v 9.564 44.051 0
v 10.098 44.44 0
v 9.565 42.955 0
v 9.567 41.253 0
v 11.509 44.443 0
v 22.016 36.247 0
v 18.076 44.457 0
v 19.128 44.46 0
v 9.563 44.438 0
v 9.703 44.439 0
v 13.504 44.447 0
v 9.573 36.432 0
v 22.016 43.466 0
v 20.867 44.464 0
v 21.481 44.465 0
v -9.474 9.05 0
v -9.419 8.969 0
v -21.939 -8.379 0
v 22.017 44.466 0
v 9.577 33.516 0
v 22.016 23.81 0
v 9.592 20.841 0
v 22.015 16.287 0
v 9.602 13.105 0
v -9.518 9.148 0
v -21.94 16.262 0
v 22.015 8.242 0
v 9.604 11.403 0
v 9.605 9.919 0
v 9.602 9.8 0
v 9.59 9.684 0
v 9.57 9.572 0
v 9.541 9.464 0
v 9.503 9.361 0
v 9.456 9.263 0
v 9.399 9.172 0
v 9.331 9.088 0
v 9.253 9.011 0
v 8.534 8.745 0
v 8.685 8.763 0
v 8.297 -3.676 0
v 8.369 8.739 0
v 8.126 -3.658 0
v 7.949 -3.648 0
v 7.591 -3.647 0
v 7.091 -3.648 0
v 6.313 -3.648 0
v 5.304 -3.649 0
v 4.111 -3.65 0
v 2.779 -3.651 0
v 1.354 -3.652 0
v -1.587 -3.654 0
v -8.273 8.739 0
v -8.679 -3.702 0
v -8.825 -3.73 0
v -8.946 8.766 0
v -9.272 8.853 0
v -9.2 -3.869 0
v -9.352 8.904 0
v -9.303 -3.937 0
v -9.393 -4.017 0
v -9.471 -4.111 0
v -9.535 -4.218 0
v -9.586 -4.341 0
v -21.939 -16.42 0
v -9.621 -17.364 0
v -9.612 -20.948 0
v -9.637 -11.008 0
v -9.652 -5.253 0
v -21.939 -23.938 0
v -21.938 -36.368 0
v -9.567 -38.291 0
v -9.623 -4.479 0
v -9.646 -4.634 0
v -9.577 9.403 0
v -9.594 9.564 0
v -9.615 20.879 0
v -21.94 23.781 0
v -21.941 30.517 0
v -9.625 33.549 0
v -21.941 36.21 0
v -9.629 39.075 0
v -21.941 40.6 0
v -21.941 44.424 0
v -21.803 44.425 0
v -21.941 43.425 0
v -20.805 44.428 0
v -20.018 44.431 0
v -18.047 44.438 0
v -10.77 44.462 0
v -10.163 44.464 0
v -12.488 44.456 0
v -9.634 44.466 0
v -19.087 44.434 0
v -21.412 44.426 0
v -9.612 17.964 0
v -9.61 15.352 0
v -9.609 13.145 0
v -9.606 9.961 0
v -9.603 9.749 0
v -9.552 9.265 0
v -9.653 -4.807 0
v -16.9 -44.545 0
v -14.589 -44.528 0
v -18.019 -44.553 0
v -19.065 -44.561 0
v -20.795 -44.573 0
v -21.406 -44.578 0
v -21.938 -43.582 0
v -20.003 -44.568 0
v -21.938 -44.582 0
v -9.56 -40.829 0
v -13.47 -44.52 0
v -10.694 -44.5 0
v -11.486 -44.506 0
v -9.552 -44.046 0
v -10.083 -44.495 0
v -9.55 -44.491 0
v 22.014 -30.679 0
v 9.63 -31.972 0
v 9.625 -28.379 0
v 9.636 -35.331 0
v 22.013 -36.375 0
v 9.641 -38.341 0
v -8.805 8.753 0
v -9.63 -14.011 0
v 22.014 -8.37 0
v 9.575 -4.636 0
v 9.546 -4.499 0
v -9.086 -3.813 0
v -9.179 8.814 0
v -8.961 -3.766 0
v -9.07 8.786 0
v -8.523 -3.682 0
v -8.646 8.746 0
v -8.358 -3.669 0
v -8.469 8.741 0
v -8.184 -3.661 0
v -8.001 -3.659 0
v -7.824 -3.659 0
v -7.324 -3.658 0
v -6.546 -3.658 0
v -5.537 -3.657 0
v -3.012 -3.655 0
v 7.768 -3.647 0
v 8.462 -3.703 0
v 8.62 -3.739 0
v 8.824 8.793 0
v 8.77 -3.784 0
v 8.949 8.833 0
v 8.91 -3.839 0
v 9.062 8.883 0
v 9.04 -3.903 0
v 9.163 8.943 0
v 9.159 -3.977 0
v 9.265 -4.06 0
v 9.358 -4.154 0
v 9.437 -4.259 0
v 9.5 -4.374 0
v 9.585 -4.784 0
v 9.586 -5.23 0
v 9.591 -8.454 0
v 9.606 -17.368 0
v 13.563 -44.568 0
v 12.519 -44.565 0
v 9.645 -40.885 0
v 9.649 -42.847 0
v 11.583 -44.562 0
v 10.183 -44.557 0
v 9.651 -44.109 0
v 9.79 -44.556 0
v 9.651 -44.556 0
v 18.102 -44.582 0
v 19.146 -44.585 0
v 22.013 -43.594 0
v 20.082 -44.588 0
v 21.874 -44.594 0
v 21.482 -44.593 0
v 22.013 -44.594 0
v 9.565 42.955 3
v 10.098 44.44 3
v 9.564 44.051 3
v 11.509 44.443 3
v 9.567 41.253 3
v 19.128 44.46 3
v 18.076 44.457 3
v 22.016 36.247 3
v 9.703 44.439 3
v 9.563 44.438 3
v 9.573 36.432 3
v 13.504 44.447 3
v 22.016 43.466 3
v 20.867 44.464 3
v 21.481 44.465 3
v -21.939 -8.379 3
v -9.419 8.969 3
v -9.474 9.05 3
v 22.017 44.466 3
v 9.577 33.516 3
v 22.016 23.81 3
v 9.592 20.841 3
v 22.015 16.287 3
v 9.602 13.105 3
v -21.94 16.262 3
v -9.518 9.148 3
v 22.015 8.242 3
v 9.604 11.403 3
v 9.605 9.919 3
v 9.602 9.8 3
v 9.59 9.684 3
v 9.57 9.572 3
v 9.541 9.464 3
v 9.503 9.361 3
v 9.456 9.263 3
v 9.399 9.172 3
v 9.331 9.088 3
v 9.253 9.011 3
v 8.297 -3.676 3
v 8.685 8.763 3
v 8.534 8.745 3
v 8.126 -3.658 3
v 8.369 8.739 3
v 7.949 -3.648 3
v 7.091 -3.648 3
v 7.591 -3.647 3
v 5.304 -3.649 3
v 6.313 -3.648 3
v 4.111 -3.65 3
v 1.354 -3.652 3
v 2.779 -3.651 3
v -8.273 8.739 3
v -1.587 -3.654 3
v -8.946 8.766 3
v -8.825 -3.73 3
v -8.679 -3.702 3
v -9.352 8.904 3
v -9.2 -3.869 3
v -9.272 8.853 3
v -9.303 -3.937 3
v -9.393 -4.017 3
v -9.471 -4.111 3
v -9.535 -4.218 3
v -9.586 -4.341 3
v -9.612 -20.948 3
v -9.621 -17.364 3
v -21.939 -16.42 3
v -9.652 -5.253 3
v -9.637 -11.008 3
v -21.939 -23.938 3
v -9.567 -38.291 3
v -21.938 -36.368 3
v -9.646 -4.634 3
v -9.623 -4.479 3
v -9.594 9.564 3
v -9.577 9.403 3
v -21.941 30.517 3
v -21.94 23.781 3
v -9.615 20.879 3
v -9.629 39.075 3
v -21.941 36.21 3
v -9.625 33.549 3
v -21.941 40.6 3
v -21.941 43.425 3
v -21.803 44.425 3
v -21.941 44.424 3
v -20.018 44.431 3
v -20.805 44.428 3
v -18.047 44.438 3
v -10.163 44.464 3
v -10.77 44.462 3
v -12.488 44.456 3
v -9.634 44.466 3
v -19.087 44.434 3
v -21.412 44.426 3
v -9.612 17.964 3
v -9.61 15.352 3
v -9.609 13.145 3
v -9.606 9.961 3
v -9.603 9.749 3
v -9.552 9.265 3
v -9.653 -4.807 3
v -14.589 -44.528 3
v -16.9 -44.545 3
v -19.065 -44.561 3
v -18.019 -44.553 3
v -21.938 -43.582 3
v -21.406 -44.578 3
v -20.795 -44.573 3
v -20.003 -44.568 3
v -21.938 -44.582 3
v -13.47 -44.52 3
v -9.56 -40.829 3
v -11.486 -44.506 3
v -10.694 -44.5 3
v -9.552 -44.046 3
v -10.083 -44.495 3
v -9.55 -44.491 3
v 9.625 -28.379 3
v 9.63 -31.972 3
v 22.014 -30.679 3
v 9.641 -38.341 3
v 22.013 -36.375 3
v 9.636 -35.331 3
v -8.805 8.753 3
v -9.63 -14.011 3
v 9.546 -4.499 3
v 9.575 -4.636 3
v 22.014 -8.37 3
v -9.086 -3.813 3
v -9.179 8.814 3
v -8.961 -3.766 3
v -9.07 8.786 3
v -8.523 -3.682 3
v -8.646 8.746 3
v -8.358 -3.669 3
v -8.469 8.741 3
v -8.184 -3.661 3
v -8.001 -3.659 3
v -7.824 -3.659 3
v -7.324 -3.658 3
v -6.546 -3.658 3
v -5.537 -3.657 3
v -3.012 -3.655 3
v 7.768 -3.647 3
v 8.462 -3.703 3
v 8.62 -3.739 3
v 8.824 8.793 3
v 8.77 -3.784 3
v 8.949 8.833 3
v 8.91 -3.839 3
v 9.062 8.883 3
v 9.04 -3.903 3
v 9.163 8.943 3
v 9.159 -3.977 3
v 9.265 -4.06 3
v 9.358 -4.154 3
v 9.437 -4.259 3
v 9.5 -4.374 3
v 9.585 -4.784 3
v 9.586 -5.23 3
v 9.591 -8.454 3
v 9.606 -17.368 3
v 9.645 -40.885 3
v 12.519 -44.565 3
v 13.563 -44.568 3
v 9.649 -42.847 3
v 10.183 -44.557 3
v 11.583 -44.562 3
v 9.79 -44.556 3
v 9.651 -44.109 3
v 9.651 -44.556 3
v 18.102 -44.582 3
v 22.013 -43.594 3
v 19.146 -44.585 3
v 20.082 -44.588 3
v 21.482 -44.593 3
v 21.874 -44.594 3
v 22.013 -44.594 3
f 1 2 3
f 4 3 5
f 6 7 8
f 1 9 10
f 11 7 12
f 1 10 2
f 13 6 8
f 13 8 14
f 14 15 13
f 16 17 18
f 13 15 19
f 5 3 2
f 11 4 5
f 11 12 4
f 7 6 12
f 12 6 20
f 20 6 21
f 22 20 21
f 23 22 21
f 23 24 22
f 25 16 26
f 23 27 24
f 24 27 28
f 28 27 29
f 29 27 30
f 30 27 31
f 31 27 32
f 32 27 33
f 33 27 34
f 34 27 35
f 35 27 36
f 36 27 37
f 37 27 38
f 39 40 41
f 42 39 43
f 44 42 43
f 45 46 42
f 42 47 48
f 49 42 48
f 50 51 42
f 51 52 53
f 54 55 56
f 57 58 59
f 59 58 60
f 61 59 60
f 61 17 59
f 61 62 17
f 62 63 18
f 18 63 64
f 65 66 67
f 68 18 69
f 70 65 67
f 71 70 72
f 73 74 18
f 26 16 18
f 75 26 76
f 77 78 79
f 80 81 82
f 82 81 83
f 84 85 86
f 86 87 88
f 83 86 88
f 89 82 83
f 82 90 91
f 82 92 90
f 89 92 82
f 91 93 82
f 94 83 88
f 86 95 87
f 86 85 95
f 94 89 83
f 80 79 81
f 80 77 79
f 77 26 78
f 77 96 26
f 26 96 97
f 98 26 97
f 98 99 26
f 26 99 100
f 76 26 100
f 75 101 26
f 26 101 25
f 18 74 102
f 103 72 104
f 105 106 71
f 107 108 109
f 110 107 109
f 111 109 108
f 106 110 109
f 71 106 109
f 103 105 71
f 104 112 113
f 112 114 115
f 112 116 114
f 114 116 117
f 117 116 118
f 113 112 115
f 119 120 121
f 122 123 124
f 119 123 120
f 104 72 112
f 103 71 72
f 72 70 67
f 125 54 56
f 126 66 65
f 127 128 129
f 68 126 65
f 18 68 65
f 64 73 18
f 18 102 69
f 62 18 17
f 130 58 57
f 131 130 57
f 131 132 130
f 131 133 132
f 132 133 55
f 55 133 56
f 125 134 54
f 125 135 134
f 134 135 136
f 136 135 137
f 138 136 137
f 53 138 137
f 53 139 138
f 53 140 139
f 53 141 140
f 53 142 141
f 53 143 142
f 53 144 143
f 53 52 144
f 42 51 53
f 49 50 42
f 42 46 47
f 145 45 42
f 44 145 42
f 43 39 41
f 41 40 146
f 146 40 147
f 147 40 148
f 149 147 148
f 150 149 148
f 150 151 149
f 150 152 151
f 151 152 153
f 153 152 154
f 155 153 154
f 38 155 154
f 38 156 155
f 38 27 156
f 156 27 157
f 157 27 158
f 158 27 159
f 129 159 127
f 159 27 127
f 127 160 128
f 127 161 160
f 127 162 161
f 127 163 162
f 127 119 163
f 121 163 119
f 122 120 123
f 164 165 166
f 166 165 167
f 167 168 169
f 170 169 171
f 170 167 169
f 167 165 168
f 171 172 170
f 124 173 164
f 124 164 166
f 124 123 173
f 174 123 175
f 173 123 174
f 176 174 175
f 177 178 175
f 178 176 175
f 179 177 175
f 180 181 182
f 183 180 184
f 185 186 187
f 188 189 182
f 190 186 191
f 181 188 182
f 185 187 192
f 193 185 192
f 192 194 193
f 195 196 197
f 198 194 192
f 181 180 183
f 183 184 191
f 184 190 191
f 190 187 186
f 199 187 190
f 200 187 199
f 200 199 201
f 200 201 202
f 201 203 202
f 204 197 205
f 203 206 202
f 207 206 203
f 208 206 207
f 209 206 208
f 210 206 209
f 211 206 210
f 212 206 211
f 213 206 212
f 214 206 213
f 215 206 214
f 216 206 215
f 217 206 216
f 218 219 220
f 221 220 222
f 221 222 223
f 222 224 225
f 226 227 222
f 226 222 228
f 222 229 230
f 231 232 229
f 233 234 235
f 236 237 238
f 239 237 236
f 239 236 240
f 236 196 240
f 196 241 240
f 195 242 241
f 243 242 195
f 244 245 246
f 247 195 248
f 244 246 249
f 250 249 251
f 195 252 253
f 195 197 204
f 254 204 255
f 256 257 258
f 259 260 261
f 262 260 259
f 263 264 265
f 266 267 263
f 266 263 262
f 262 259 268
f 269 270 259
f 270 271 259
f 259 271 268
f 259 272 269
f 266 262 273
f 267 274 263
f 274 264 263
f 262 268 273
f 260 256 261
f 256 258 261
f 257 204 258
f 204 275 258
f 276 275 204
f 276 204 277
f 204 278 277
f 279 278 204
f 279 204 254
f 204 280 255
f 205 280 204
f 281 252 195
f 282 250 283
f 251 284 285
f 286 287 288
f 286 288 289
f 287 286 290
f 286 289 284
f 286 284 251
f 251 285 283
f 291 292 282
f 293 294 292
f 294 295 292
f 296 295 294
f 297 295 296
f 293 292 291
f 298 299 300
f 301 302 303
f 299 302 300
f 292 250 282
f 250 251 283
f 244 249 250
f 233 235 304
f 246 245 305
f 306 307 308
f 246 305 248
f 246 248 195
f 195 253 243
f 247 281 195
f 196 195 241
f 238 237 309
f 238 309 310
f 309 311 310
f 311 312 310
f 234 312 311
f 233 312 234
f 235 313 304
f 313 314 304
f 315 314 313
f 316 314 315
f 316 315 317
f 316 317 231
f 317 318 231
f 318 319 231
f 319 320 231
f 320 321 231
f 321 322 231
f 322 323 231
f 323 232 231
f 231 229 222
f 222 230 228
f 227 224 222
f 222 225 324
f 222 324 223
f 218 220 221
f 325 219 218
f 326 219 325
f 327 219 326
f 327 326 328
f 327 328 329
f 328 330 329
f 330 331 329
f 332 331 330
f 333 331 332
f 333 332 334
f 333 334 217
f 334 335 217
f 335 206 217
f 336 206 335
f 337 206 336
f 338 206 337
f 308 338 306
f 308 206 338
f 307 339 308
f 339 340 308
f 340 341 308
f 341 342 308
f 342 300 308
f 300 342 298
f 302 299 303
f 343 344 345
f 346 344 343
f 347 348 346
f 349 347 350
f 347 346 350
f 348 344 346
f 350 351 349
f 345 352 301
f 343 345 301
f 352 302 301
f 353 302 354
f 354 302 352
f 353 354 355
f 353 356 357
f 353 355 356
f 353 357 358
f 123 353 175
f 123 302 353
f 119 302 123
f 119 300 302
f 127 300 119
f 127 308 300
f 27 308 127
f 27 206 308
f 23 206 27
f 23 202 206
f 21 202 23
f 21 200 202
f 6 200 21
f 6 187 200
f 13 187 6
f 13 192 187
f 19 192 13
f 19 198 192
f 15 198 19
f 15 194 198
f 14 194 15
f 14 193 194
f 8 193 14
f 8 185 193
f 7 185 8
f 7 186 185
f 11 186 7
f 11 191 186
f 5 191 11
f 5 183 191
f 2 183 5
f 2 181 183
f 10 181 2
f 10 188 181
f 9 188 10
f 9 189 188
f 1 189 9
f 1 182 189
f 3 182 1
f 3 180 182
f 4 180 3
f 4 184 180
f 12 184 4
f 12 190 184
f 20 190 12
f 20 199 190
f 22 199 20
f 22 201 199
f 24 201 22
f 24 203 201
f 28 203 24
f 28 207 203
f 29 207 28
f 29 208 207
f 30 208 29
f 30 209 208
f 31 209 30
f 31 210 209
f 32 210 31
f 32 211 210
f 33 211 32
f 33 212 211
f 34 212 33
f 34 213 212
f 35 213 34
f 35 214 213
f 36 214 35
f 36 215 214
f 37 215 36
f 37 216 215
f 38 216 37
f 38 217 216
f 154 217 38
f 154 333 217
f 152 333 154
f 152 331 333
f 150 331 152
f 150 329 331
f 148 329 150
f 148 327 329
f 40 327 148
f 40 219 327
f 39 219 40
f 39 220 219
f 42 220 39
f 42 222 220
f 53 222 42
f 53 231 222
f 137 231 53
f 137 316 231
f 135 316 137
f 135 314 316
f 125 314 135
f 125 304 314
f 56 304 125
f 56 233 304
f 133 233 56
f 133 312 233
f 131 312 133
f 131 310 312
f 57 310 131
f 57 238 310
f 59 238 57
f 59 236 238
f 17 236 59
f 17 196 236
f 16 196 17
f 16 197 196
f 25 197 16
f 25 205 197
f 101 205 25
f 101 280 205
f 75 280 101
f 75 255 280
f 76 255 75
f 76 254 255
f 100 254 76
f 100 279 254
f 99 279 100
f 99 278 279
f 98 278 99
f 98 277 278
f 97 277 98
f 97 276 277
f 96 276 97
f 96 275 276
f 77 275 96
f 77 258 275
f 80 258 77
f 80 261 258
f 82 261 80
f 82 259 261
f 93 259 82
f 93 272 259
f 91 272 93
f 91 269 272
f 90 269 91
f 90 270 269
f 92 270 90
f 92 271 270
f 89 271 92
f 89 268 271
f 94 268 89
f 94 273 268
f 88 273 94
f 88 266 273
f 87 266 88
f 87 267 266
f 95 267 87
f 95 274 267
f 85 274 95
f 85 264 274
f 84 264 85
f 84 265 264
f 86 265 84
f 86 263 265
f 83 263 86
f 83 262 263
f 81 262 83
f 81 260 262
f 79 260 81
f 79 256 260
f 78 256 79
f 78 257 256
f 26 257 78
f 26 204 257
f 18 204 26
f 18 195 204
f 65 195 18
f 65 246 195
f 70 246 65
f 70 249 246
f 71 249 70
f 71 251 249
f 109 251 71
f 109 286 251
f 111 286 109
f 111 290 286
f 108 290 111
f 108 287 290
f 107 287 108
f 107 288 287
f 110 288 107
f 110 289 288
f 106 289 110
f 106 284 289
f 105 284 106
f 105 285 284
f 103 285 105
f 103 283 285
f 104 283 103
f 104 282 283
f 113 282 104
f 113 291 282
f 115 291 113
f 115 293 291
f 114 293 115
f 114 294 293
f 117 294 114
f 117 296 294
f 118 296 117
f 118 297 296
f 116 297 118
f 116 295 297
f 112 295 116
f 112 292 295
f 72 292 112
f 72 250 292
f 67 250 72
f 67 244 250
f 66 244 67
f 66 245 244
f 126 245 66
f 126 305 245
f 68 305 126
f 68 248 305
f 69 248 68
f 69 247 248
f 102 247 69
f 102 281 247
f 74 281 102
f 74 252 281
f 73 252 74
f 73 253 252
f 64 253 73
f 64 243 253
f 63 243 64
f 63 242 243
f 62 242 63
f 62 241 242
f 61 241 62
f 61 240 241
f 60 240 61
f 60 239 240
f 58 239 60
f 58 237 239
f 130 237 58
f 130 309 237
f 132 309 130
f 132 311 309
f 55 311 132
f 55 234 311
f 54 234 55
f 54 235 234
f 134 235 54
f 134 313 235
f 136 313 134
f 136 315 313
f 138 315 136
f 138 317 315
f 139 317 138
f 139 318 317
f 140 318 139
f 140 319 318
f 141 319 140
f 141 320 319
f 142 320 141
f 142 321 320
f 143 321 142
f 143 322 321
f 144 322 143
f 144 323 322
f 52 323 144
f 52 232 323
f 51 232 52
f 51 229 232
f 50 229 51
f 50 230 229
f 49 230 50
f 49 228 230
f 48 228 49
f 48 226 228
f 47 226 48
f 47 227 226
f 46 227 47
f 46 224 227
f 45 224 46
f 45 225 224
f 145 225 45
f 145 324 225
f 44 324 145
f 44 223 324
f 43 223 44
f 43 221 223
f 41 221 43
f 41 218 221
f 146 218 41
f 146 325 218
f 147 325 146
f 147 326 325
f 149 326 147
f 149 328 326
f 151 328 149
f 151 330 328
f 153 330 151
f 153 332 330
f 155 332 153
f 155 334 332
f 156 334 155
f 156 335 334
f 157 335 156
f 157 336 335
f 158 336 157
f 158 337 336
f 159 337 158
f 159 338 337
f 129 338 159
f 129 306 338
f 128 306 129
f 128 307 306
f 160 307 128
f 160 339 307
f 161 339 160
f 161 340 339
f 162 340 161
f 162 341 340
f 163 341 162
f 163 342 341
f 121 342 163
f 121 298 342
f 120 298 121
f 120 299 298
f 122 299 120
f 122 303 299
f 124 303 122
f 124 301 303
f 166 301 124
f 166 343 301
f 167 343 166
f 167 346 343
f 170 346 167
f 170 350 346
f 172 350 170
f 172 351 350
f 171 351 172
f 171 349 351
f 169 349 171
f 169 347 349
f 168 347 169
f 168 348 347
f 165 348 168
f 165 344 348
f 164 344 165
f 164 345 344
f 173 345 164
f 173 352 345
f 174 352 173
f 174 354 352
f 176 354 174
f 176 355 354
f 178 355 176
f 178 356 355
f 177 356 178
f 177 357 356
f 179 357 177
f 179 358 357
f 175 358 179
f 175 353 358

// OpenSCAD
// Generated from 交通部公路局（原交通部公路總局）「新式號牌使用之英文字、數字字體」author trace
fudge = 0.1;

module glyph_2012_H(h = 3) {
  difference() {
    linear_extrude(height = h)
      polygon(points = [[-21.9413, 44.4244], [-21.9412, 43.4248], [-21.9411, 40.5999], [-21.941, 36.2105], [-21.9408, 30.5172], [-21.9405, 23.7809], [-21.9403, 16.2623], [-21.94, 8.2223], [-21.9397, -0.0786], [-21.9394, -8.3795], [-21.9392, -16.4196], [-21.9389, -23.9381], [-21.9387, -30.6744], [-21.9385, -36.3677], [-21.9383, -40.7572], [-21.9382, -43.5821], [-21.9382, -44.5816], [-21.7991, -44.5806], [-21.4059, -44.5778], [-20.795, -44.5733], [-20.0026, -44.5676], [-19.0651, -44.5607], [-18.0187, -44.5531], [-16.8997, -44.545], [-15.7444, -44.5366], [-14.5891, -44.5282], [-13.4701, -44.52], [-12.4237, -44.5124], [-11.4861, -44.5056], [-10.6937, -44.4998], [-10.0828, -44.4954], [-9.6897, -44.4925], [-9.5505, -44.4915], [-9.5517, -44.0459], [-9.555, -42.7864], [-9.5601, -40.8293], [-9.5666, -38.2909], [-9.5744, -35.2875], [-9.5831, -31.9352], [-9.5924, -28.3505], [-9.602, -24.6495], [-9.6116, -20.9485], [-9.621, -17.3638], [-9.6297, -14.0115], [-9.6374, -11.0081], [-9.644, -8.4697], [-9.6491, -6.5126], [-9.6524, -5.2531], [-9.6535, -4.8075], [-9.6459, -4.6345], [-9.6233, -4.4792], [-9.5863, -4.3408], [-9.5353, -4.2183], [-9.4707, -4.1108], [-9.393, -4.0174], [-9.3028, -3.9371], [-9.2004, -3.8692], [-9.0864, -3.8126], [-8.9612, -3.7665], [-8.8253, -3.7299], [-8.6792, -3.702], [-8.5232, -3.6819], [-8.358, -3.6686], [-8.1839, -3.6612], [-8.0015, -3.6589], [-7.8244, -3.6587], [-7.3239, -3.6584], [-6.5462, -3.6578], [-5.5374, -3.6571], [-4.3439, -3.6562], [-3.0118, -3.6552], [-1.5872, -3.6542], [-0.1165, -3.6531], [1.3542, -3.652], [2.7788, -3.651], [4.1109, -3.65], [5.3044, -3.6492], [6.3132, -3.6484], [7.0909, -3.6479], [7.5914, -3.6475], [7.7685, -3.6474], [7.9491, -3.6485], [8.1256, -3.658], [8.2969, -3.6762], [8.4621, -3.7031], [8.6201, -3.739], [8.7698, -3.7841], [8.9102, -3.8386], [9.0403, -3.9027], [9.1591, -3.9766], [9.2655, -4.0604], [9.3584, -4.1544], [9.4368, -4.2588], [9.4998, -4.3737], [9.5462, -4.4994], [9.575, -4.6361], [9.5853, -4.7839], [9.586, -5.2305], [9.5881, -6.4928], [9.5914, -8.4542], [9.5956, -10.9982], [9.6006, -14.0083], [9.6062, -17.3679], [9.6122, -20.9606], [9.6184, -24.6698], [9.6246, -28.379], [9.6305, -31.9717], [9.6361, -35.3313], [9.6412, -38.3414], [9.6454, -40.8854], [9.6487, -42.8468], [9.6508, -44.1091], [9.6515, -44.5558], [9.7903, -44.5562], [10.1827, -44.5575], [10.7923, -44.5594], [11.583, -44.5618], [12.5186, -44.5648], [13.5628, -44.568], [14.6794, -44.5715], [15.8323, -44.5751], [16.9851, -44.5787], [18.1018, -44.5822], [19.146, -44.5855], [20.0816, -44.5884], [20.8723, -44.5909], [21.4819, -44.5928], [21.8742, -44.5941], [22.0131, -44.5945], [22.0131, -43.5943], [22.0132, -40.7677], [22.0134, -36.3755], [22.0136, -30.6788], [22.0139, -23.9383], [22.0142, -16.4152], [22.0145, -8.3701], [22.0148, -0.0642], [22.0151, 8.2418], [22.0155, 16.2868], [22.0158, 23.81], [22.016, 30.5504], [22.0162, 36.2472], [22.0164, 40.6393], [22.0165, 43.4659], [22.0166, 44.4661], [21.8767, 44.4658], [21.4815, 44.4649], [20.8673, 44.4636], [20.0708, 44.4618], [19.1282, 44.4597], [18.0763, 44.4574], [16.9514, 44.4549], [15.79, 44.4523], [14.6286, 44.4497], [13.5036, 44.4472], [12.4517, 44.4449], [11.5092, 44.4428], [10.7126, 44.441], [10.0985, 44.4396], [9.7032, 44.4388], [9.5634, 44.4384], [9.5638, 44.0508], [9.5652, 42.9552], [9.5672, 41.2528], [9.5699, 39.0448], [9.5731, 36.4323], [9.5767, 33.5164], [9.5805, 30.3982], [9.5844, 27.1789], [9.5883, 23.9596], [9.5921, 20.8415], [9.5957, 17.9255], [9.5989, 15.313], [9.6016, 13.105], [9.6036, 11.4027], [9.605, 10.3071], [9.6055, 9.9194], [9.6017, 9.8003], [9.59, 9.6842], [9.57, 9.5719], [9.5413, 9.4639], [9.5035, 9.3608], [9.4562, 9.2635], [9.399, 9.1723], [9.3314, 9.0881], [9.253, 9.0114], [9.1635, 8.9429], [9.0624, 8.8831], [8.9493, 8.8328], [8.8238, 8.7926], [8.6855, 8.7631], [8.5339, 8.7449], [8.3687, 8.7387], [8.1819, 8.7387], [7.6537, 8.7387], [6.833, 8.7387], [5.7685, 8.7387], [4.5091, 8.7387], [3.1033, 8.7387], [1.6001, 8.7387], [0.0481, 8.7387], [-1.5039, 8.7387], [-3.0072, 8.7387], [-4.4129, 8.7387], [-5.6724, 8.7387], [-6.7368, 8.7387], [-7.5575, 8.7387], [-8.0857, 8.7387], [-8.2726, 8.7387], [-8.4692, 8.7413], [-8.6463, 8.7456], [-8.8048, 8.7533], [-8.9458, 8.7661], [-9.0701, 8.7859], [-9.1786, 8.8143], [-9.2724, 8.8531], [-9.3523, 8.9041], [-9.4193, 8.969], [-9.4743, 9.0496], [-9.5184, 9.1477], [-9.5523, 9.2649], [-9.5771, 9.4032], [-9.5937, 9.5641], [-9.6031, 9.7495], [-9.6061, 9.9611], [-9.6064, 10.3486], [-9.6073, 11.4437], [-9.6087, 13.1454], [-9.6104, 15.3525], [-9.6125, 17.964], [-9.6149, 20.8787], [-9.6174, 23.9956], [-9.62, 27.2137], [-9.6226, 30.4317], [-9.6251, 33.5486], [-9.6274, 36.4633], [-9.6295, 39.0748], [-9.6313, 41.2819], [-9.6327, 42.9836], [-9.6336, 44.0787], [-9.6339, 44.4662], [-9.7721, 44.4657], [-10.1627, 44.4644], [-10.7697, 44.4624], [-11.5569, 44.4597], [-12.4884, 44.4565], [-13.528, 44.453], [-14.6398, 44.4492], [-15.7876, 44.4453], [-16.9354, 44.4414], [-18.0471, 44.4376], [-19.0868, 44.4341], [-20.0182, 44.4309], [-20.8055, 44.4283], [-21.4124, 44.4262], [-21.803, 44.4249]]);
  }
}

glyph_2012_H();
